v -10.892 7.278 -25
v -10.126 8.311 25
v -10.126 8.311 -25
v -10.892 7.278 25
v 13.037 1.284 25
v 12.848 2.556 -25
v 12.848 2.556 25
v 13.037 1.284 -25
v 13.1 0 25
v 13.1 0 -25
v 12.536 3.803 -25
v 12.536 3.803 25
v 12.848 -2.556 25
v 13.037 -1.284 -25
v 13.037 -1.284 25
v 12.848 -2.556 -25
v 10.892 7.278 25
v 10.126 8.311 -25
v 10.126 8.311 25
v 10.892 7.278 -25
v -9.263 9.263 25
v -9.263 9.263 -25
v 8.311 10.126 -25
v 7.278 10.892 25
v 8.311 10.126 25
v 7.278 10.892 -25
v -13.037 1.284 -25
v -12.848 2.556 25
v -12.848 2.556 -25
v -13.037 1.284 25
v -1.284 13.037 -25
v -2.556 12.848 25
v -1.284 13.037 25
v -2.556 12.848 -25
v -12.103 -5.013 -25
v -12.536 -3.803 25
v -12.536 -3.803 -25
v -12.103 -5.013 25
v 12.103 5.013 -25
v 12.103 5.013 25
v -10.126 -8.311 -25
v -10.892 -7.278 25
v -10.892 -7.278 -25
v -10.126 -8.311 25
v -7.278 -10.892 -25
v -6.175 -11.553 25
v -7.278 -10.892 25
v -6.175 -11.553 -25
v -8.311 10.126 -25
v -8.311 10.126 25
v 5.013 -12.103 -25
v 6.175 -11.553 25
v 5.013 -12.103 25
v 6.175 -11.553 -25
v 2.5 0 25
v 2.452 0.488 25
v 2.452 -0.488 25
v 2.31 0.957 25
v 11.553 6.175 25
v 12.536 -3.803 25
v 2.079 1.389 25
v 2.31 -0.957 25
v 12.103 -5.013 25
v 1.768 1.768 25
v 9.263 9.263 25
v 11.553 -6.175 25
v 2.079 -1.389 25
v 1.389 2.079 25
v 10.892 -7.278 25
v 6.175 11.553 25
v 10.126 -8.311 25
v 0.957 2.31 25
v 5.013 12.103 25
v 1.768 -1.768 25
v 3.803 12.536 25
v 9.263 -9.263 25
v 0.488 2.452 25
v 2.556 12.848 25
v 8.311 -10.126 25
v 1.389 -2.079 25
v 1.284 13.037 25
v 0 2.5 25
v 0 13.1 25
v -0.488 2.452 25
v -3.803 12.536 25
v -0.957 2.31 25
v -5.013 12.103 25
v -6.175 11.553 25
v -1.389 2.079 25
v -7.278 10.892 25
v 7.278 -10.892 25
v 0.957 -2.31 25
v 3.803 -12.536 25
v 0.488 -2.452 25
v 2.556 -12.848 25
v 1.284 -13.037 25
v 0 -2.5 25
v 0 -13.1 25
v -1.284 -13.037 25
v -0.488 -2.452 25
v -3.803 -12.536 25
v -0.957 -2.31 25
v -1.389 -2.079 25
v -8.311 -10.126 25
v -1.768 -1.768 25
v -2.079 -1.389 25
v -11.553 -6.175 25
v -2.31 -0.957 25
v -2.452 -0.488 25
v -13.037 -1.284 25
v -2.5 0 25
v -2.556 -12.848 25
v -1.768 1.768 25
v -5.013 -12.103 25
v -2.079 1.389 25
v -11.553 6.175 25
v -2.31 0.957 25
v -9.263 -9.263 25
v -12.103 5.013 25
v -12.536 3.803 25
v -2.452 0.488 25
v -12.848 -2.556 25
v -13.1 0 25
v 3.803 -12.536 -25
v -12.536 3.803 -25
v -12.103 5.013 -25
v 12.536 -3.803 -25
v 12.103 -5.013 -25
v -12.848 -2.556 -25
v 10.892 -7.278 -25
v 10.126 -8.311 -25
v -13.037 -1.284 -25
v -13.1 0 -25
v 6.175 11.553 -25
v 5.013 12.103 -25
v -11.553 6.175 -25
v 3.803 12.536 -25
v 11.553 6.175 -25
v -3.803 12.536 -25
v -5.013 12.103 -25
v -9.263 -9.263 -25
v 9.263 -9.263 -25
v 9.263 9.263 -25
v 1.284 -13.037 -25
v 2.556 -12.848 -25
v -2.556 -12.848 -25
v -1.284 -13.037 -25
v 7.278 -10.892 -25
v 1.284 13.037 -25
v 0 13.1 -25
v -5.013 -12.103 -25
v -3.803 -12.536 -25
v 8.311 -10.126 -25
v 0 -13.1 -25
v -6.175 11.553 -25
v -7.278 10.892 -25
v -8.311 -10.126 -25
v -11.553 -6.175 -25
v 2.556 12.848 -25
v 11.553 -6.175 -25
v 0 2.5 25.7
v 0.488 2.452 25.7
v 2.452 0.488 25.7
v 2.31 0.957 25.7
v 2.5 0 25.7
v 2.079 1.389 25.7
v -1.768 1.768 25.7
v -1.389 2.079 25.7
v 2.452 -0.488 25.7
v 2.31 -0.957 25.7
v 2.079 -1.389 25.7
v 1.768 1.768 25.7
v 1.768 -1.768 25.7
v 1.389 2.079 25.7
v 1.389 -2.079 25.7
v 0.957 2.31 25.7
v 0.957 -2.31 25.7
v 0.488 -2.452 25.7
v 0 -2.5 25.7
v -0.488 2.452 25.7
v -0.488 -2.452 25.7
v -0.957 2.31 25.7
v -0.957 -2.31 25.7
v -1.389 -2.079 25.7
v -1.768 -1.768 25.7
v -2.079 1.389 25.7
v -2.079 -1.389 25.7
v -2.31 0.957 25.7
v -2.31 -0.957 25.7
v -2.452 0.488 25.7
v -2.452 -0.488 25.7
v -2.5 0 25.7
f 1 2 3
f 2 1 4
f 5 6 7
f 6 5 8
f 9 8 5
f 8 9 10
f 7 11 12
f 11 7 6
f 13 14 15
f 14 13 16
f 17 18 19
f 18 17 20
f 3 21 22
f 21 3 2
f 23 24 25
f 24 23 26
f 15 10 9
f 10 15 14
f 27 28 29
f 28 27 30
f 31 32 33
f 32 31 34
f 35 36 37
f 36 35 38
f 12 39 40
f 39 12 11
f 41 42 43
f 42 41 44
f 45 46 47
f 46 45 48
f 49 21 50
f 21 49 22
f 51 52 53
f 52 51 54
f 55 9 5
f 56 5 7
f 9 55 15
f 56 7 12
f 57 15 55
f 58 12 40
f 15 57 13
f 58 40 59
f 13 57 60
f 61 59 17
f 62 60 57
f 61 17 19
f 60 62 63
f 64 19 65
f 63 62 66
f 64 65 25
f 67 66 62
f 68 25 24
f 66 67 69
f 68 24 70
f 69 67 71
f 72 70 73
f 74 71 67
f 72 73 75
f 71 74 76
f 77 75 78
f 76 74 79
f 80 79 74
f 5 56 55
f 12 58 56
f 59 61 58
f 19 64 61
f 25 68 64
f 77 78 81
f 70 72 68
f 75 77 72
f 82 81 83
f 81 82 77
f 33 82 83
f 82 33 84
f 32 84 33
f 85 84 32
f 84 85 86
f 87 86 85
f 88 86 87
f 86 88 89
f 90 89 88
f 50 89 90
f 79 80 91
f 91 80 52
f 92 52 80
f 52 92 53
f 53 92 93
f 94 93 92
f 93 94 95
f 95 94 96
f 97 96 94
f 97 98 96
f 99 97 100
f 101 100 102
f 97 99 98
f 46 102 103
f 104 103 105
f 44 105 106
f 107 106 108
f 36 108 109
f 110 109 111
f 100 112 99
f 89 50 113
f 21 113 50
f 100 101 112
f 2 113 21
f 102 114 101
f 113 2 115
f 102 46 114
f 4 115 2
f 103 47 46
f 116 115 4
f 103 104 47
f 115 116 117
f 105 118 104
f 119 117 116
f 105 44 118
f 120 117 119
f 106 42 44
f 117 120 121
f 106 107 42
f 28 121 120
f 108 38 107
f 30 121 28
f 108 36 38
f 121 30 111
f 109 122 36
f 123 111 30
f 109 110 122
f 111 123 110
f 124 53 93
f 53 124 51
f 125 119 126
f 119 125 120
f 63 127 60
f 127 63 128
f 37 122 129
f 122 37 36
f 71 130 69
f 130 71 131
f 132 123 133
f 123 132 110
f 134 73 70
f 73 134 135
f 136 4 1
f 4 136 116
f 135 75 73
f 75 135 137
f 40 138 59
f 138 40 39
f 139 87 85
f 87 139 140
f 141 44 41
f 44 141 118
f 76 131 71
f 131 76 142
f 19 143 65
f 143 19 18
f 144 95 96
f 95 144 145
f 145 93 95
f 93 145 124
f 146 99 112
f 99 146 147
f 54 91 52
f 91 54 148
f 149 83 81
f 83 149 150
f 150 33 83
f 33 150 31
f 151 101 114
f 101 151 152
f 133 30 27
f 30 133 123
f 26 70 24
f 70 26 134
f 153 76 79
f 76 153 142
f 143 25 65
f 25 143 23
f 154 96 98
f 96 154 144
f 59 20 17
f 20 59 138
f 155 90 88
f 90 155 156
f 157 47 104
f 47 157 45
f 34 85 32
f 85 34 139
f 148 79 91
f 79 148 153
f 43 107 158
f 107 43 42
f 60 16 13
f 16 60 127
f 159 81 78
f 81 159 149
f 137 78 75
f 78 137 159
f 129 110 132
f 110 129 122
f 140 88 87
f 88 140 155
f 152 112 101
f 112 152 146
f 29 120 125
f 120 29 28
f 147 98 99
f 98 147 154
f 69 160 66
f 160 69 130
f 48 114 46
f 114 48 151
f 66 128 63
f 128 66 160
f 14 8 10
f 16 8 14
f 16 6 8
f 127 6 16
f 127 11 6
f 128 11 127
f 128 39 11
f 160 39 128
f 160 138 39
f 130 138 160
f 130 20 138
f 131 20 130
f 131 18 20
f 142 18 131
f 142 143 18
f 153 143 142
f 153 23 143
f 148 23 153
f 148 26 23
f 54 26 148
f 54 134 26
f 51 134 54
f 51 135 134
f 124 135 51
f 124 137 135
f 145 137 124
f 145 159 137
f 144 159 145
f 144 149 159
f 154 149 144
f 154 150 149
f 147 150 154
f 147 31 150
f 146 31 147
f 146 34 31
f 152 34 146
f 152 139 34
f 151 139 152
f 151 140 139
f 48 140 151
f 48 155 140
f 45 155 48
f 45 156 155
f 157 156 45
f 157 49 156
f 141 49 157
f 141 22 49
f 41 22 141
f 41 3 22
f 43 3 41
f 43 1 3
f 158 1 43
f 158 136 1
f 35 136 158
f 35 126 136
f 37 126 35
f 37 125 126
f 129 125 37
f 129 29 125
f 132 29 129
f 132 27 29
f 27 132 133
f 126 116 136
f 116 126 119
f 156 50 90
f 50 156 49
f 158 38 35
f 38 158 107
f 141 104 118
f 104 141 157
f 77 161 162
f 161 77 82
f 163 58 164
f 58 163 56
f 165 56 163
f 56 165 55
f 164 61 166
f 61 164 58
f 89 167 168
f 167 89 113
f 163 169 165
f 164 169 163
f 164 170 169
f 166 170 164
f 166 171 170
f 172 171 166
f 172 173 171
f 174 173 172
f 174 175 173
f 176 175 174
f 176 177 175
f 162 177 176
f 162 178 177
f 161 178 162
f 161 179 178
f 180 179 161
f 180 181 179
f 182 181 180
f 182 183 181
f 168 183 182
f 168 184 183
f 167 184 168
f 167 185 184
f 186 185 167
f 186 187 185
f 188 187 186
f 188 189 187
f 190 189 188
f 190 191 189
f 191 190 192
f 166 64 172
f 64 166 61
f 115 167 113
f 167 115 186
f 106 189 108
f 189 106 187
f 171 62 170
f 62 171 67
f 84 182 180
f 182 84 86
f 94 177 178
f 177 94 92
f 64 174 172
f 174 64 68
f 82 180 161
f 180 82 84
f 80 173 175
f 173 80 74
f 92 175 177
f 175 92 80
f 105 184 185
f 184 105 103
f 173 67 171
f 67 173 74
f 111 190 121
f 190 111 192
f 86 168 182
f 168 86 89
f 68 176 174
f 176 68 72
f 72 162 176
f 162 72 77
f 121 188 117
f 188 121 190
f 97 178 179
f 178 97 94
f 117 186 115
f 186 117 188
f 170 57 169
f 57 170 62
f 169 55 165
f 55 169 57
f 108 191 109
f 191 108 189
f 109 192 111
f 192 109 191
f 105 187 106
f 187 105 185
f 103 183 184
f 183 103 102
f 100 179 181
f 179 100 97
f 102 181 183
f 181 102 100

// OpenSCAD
// Parameters
height_mm = 50; //[25:100:0.1]
diameter_mm = 26.2; //[13.1:52.4:0.1]
positive_terminal_diameter_mm = 5; //[2.5:10:0.1]
positive_terminal_height_mm = 1.5; //[0.75:3:0.1]
negative_terminal_diameter_mm = 8; //[4:16:0.1]
negative_terminal_height_mm = 0.2; //[0.1:0.6:0.05]
terminal_overlap_mm = 0.8; //[0.2:2:0.1]

// Battery - complete geometry
module battery() {
  union() {
    // Cylindrical cell body
    color("DimGray") {
      translate([0, 0, 0])
        cylinder(h=height_mm, r=diameter_mm/2, center=true, $fn=64);
    }
    // Positive terminal button
    color("Silver") {
      translate([0, 0, height_mm/2 + positive_terminal_height_mm/2 - terminal_overlap_mm])
        cylinder(h=positive_terminal_height_mm, r=positive_terminal_diameter_mm/2, center=true, $fn=32);
    }
    // Negative terminal contact
    color("Silver") {
      translate([0, 0, -height_mm/2 - negative_terminal_height_mm/2 + terminal_overlap_mm])
        cylinder(h=negative_terminal_height_mm, r=negative_terminal_diameter_mm/2, center=true, $fn=32);
    }
  }
}

// Assembly
module assembly() {
  battery();
}

assembly();
